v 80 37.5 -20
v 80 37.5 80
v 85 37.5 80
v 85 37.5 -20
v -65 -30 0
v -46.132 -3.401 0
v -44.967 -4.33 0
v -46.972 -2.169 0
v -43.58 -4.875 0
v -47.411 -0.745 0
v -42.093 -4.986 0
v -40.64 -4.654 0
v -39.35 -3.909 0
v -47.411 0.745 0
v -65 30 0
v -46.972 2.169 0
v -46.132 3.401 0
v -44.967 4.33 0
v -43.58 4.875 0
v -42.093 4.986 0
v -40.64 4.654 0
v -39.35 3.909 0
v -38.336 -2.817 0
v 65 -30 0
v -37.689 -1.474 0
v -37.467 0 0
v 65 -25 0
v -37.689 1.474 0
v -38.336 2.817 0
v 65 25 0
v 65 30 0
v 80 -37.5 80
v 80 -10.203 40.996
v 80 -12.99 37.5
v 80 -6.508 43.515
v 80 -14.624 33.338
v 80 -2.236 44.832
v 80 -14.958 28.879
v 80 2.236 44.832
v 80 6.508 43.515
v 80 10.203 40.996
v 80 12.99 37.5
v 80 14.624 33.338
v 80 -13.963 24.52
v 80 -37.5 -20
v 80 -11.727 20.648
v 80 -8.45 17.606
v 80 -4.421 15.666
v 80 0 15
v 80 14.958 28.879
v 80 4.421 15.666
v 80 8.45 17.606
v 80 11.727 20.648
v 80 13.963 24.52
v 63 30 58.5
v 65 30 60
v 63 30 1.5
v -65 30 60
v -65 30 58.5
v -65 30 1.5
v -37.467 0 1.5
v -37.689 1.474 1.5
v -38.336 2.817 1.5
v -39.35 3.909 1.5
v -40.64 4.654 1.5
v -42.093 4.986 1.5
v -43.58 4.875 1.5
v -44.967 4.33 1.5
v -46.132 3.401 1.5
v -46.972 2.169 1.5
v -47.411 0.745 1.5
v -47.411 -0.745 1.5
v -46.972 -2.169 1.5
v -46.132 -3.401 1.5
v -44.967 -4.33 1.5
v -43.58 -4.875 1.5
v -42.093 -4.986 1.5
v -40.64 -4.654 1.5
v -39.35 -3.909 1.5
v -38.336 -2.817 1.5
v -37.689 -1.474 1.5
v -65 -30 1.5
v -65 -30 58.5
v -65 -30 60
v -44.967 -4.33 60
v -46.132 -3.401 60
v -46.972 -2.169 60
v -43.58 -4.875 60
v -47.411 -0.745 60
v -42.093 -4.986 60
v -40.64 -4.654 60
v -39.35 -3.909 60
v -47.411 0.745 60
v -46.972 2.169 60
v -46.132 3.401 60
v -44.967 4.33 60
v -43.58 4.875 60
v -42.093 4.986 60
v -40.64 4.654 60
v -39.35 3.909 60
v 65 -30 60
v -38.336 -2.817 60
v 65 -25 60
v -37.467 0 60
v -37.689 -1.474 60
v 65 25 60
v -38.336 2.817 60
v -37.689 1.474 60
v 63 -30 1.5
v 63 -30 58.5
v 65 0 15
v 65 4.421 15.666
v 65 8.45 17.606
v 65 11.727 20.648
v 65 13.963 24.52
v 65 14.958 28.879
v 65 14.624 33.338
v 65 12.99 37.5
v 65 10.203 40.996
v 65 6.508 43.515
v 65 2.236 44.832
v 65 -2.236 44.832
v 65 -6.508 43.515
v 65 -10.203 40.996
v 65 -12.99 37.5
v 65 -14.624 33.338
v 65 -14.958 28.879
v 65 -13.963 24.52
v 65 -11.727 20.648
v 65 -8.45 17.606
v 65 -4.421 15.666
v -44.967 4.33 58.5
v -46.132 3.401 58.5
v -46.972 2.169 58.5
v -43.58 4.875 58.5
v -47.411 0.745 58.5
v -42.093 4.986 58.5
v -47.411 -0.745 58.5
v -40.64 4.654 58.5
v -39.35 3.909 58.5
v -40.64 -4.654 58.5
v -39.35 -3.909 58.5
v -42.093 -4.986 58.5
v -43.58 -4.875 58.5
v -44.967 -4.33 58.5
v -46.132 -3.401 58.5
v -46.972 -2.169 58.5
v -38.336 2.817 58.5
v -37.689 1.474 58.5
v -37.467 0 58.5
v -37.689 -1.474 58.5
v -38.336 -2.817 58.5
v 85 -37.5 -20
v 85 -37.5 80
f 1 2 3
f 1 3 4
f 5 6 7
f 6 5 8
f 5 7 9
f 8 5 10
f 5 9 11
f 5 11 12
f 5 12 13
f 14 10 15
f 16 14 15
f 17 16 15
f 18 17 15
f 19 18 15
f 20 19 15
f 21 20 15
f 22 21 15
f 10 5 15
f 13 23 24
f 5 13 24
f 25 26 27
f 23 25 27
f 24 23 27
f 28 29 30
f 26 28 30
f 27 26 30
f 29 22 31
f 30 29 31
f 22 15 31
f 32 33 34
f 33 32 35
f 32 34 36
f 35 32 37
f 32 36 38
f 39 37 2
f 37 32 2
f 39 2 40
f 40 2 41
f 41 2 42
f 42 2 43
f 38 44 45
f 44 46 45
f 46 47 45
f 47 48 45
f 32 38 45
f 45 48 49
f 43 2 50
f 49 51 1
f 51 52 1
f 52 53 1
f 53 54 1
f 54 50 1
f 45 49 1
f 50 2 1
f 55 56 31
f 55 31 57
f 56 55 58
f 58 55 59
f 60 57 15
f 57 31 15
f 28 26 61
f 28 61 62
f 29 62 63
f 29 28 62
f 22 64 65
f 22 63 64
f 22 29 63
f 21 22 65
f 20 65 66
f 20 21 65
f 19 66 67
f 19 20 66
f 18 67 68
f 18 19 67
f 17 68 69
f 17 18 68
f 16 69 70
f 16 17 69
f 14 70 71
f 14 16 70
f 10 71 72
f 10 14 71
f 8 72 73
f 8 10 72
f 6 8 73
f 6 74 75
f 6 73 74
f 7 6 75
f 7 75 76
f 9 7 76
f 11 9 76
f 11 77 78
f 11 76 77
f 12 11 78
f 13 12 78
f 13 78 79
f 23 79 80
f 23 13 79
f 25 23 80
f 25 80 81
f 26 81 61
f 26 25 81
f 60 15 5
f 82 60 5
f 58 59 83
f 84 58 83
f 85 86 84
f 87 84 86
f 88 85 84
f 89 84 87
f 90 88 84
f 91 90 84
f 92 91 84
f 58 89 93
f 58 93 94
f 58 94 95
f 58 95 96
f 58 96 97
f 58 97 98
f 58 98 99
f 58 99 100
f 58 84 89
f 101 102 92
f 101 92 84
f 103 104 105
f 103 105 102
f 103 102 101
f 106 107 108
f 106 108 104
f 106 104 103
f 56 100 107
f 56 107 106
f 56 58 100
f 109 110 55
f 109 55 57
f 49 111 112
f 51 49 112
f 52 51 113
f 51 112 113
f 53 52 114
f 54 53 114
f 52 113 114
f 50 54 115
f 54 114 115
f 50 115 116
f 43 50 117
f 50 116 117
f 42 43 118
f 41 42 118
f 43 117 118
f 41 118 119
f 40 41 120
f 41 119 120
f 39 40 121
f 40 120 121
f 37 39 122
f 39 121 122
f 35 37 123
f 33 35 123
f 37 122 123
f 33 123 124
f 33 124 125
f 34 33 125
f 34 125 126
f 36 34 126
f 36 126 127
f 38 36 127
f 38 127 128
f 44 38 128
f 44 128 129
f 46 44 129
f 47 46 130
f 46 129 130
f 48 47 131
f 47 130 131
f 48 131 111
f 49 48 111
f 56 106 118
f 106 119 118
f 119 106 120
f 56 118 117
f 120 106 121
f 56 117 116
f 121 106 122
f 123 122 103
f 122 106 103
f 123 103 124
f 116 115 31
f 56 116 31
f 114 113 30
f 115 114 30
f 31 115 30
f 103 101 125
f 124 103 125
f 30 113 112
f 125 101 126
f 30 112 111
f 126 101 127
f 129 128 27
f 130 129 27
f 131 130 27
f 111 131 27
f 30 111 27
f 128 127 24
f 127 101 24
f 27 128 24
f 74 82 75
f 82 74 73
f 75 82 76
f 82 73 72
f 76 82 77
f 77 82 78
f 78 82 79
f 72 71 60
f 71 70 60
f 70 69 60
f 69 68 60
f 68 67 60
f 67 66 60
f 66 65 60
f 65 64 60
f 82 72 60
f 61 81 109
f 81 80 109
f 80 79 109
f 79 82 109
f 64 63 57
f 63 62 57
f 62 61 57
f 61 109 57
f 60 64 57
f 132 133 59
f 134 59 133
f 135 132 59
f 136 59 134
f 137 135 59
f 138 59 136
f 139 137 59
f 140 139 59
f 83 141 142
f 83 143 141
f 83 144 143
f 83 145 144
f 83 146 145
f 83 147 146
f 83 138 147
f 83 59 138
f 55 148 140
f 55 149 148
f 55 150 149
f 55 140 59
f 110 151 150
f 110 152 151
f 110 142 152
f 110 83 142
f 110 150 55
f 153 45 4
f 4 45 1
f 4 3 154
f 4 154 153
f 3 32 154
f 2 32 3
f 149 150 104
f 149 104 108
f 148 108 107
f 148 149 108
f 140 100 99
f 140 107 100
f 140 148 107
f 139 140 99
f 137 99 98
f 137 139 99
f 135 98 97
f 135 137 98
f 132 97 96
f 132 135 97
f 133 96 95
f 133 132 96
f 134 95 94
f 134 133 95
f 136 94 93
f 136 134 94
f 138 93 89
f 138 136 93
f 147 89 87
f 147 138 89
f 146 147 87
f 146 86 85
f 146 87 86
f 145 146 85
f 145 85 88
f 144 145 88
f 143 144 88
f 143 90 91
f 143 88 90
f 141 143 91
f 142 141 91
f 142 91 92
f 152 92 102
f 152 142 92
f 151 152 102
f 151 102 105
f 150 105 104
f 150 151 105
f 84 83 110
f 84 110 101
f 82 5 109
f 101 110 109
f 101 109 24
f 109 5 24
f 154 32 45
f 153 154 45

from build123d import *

# Parameters (mm, degrees)
RESSALTO_EXTRUS_O1_DEPTH   = 60
CORTE_EXTRUS_O1_DEPTH      = 148.170653102
CORTE_EXTRUS_O1_DEPTH_BACK = 148.170653102
CORTE_EXTRUS_O2_DEPTH      = 148.170653102
CORTE_EXTRUS_O2_DEPTH_BACK = 148.170653102
ESBO_O5_W                  = 126
ESBO_O5_H                  = 57
ESBO_O6_W                  = 57
ESBO_O6_H                  = 60
CORTE_EXTRUS_O3_DEPTH      = 57
CORTE_EXTRUS_O4_DEPTH      = 148.170653102
CORTE_EXTRUS_O4_DEPTH_BACK = 57
ESBO_O7_R                  = 5
CORTE_EXTRUS_O5_DEPTH      = 148.170653102
CORTE_EXTRUS_O5_DEPTH_BACK = 148.170653102
ESBO_O8_W                  = 65.993133921
ESBO_O8_H                  = 60
ESBO_O13_R                 = 15
RESSALTO_EXTRUS_O2_DEPTH   = 15
ESBO_O14_W                 = 100
ESBO_O14_H                 = 75
RESSALTO_EXTRUS_O3_DEPTH   = 5


with BuildPart() as part:
    # Esboço1 → Ressalto-extrusão1 (new body)
    with BuildSketch(Plane.XY):
        with BuildLine():
            Line((65, 30), (-65, 30))
            Line((-65, 30), (-65, -30))
            Line((-65, -30), (65, -30))
            ThreePointArc((65, -30), (101.246012625, -22.148036763), (130.993133921, 0))
            ThreePointArc((130.993133921, 0), (101.246012625, 22.148036763), (65, 30))
        make_face()
    extrude(amount=RESSALTO_EXTRUS_O1_DEPTH)

    # Esboço3 → Corte-extrusão1 (cut, two sides: drawn at the far end of the back side and taken through both)
    with BuildSketch(Plane.XY.offset(-CORTE_EXTRUS_O1_DEPTH_BACK)):
        with BuildLine():
            Line((65, 25), (65, -25))
            ThreePointArc((65, -25), (88.305470739, -18.221231084), (104.339291624, 0))
            ThreePointArc((104.339291624, 0), (88.305470739, 18.221231084), (65, 25))
        make_face()
    extrude(amount=CORTE_EXTRUS_O1_DEPTH + CORTE_EXTRUS_O1_DEPTH_BACK, mode=Mode.SUBTRACT)

    # Esboço5 → Corte-extrusão2 (cut, two sides: drawn at the far end of the back side and taken through both)
    with BuildSketch(Plane(origin=(0, 0, 0), x_dir=(1, 0, 0), z_dir=(0, 1, 0)).offset(-CORTE_EXTRUS_O2_DEPTH_BACK)):
        with Locations((0, -30)):
            Rectangle(ESBO_O5_W, ESBO_O5_H)
    extrude(amount=CORTE_EXTRUS_O2_DEPTH + CORTE_EXTRUS_O2_DEPTH_BACK, mode=Mode.SUBTRACT)

    # Esboço6 → Corte-extrusão3 (cut)
    with BuildSketch(Plane(origin=(-63, 0, 0), x_dir=(0, 0, -1), z_dir=(1, 0, 0))):
        with Locations((-30, 0)):
            Rectangle(ESBO_O6_W, ESBO_O6_H)
    extrude(amount=-CORTE_EXTRUS_O3_DEPTH, mode=Mode.SUBTRACT)

    # Esboço7 → Corte-extrusão4 (cut, two sides: drawn at the far end of the back side and taken through both)
    with BuildSketch(Plane.XY.offset(-CORTE_EXTRUS_O4_DEPTH_BACK)):
        with Locations((-42.467037106, 0)):
            Circle(ESBO_O7_R)
    extrude(amount=CORTE_EXTRUS_O4_DEPTH + CORTE_EXTRUS_O4_DEPTH_BACK, mode=Mode.SUBTRACT)

    # Esboço8 → Corte-extrusão5 (cut, two sides: drawn at the far end of the back side and taken through both)
    with BuildSketch(Plane(origin=(0, 0, 0), x_dir=(1, 0, 0), z_dir=(0, 1, 0)).offset(-CORTE_EXTRUS_O5_DEPTH_BACK)):
        with Locations((97.996566961, -30)):
            Rectangle(ESBO_O8_W, ESBO_O8_H)
    extrude(amount=CORTE_EXTRUS_O5_DEPTH + CORTE_EXTRUS_O5_DEPTH_BACK, mode=Mode.SUBTRACT)

    # Esboço13 → Ressalto-extrusão2 (add)
    with BuildSketch(Plane(origin=(65, 0, 0), x_dir=(0, 0, -1), z_dir=(1, 0, 0))):
        with Locations((-30, 0)):
            Circle(ESBO_O13_R)
    extrude(amount=RESSALTO_EXTRUS_O2_DEPTH)

    # Esboço14 → Ressalto-extrusão3 (add)
    with BuildSketch(Plane(origin=(80, 0, 0), x_dir=(0, 0, -1), z_dir=(1, 0, 0))):
        with Locations((-30, 0)):
            Rectangle(ESBO_O14_W, ESBO_O14_H)
    extrude(amount=RESSALTO_EXTRUS_O3_DEPTH)


solid = part.part
